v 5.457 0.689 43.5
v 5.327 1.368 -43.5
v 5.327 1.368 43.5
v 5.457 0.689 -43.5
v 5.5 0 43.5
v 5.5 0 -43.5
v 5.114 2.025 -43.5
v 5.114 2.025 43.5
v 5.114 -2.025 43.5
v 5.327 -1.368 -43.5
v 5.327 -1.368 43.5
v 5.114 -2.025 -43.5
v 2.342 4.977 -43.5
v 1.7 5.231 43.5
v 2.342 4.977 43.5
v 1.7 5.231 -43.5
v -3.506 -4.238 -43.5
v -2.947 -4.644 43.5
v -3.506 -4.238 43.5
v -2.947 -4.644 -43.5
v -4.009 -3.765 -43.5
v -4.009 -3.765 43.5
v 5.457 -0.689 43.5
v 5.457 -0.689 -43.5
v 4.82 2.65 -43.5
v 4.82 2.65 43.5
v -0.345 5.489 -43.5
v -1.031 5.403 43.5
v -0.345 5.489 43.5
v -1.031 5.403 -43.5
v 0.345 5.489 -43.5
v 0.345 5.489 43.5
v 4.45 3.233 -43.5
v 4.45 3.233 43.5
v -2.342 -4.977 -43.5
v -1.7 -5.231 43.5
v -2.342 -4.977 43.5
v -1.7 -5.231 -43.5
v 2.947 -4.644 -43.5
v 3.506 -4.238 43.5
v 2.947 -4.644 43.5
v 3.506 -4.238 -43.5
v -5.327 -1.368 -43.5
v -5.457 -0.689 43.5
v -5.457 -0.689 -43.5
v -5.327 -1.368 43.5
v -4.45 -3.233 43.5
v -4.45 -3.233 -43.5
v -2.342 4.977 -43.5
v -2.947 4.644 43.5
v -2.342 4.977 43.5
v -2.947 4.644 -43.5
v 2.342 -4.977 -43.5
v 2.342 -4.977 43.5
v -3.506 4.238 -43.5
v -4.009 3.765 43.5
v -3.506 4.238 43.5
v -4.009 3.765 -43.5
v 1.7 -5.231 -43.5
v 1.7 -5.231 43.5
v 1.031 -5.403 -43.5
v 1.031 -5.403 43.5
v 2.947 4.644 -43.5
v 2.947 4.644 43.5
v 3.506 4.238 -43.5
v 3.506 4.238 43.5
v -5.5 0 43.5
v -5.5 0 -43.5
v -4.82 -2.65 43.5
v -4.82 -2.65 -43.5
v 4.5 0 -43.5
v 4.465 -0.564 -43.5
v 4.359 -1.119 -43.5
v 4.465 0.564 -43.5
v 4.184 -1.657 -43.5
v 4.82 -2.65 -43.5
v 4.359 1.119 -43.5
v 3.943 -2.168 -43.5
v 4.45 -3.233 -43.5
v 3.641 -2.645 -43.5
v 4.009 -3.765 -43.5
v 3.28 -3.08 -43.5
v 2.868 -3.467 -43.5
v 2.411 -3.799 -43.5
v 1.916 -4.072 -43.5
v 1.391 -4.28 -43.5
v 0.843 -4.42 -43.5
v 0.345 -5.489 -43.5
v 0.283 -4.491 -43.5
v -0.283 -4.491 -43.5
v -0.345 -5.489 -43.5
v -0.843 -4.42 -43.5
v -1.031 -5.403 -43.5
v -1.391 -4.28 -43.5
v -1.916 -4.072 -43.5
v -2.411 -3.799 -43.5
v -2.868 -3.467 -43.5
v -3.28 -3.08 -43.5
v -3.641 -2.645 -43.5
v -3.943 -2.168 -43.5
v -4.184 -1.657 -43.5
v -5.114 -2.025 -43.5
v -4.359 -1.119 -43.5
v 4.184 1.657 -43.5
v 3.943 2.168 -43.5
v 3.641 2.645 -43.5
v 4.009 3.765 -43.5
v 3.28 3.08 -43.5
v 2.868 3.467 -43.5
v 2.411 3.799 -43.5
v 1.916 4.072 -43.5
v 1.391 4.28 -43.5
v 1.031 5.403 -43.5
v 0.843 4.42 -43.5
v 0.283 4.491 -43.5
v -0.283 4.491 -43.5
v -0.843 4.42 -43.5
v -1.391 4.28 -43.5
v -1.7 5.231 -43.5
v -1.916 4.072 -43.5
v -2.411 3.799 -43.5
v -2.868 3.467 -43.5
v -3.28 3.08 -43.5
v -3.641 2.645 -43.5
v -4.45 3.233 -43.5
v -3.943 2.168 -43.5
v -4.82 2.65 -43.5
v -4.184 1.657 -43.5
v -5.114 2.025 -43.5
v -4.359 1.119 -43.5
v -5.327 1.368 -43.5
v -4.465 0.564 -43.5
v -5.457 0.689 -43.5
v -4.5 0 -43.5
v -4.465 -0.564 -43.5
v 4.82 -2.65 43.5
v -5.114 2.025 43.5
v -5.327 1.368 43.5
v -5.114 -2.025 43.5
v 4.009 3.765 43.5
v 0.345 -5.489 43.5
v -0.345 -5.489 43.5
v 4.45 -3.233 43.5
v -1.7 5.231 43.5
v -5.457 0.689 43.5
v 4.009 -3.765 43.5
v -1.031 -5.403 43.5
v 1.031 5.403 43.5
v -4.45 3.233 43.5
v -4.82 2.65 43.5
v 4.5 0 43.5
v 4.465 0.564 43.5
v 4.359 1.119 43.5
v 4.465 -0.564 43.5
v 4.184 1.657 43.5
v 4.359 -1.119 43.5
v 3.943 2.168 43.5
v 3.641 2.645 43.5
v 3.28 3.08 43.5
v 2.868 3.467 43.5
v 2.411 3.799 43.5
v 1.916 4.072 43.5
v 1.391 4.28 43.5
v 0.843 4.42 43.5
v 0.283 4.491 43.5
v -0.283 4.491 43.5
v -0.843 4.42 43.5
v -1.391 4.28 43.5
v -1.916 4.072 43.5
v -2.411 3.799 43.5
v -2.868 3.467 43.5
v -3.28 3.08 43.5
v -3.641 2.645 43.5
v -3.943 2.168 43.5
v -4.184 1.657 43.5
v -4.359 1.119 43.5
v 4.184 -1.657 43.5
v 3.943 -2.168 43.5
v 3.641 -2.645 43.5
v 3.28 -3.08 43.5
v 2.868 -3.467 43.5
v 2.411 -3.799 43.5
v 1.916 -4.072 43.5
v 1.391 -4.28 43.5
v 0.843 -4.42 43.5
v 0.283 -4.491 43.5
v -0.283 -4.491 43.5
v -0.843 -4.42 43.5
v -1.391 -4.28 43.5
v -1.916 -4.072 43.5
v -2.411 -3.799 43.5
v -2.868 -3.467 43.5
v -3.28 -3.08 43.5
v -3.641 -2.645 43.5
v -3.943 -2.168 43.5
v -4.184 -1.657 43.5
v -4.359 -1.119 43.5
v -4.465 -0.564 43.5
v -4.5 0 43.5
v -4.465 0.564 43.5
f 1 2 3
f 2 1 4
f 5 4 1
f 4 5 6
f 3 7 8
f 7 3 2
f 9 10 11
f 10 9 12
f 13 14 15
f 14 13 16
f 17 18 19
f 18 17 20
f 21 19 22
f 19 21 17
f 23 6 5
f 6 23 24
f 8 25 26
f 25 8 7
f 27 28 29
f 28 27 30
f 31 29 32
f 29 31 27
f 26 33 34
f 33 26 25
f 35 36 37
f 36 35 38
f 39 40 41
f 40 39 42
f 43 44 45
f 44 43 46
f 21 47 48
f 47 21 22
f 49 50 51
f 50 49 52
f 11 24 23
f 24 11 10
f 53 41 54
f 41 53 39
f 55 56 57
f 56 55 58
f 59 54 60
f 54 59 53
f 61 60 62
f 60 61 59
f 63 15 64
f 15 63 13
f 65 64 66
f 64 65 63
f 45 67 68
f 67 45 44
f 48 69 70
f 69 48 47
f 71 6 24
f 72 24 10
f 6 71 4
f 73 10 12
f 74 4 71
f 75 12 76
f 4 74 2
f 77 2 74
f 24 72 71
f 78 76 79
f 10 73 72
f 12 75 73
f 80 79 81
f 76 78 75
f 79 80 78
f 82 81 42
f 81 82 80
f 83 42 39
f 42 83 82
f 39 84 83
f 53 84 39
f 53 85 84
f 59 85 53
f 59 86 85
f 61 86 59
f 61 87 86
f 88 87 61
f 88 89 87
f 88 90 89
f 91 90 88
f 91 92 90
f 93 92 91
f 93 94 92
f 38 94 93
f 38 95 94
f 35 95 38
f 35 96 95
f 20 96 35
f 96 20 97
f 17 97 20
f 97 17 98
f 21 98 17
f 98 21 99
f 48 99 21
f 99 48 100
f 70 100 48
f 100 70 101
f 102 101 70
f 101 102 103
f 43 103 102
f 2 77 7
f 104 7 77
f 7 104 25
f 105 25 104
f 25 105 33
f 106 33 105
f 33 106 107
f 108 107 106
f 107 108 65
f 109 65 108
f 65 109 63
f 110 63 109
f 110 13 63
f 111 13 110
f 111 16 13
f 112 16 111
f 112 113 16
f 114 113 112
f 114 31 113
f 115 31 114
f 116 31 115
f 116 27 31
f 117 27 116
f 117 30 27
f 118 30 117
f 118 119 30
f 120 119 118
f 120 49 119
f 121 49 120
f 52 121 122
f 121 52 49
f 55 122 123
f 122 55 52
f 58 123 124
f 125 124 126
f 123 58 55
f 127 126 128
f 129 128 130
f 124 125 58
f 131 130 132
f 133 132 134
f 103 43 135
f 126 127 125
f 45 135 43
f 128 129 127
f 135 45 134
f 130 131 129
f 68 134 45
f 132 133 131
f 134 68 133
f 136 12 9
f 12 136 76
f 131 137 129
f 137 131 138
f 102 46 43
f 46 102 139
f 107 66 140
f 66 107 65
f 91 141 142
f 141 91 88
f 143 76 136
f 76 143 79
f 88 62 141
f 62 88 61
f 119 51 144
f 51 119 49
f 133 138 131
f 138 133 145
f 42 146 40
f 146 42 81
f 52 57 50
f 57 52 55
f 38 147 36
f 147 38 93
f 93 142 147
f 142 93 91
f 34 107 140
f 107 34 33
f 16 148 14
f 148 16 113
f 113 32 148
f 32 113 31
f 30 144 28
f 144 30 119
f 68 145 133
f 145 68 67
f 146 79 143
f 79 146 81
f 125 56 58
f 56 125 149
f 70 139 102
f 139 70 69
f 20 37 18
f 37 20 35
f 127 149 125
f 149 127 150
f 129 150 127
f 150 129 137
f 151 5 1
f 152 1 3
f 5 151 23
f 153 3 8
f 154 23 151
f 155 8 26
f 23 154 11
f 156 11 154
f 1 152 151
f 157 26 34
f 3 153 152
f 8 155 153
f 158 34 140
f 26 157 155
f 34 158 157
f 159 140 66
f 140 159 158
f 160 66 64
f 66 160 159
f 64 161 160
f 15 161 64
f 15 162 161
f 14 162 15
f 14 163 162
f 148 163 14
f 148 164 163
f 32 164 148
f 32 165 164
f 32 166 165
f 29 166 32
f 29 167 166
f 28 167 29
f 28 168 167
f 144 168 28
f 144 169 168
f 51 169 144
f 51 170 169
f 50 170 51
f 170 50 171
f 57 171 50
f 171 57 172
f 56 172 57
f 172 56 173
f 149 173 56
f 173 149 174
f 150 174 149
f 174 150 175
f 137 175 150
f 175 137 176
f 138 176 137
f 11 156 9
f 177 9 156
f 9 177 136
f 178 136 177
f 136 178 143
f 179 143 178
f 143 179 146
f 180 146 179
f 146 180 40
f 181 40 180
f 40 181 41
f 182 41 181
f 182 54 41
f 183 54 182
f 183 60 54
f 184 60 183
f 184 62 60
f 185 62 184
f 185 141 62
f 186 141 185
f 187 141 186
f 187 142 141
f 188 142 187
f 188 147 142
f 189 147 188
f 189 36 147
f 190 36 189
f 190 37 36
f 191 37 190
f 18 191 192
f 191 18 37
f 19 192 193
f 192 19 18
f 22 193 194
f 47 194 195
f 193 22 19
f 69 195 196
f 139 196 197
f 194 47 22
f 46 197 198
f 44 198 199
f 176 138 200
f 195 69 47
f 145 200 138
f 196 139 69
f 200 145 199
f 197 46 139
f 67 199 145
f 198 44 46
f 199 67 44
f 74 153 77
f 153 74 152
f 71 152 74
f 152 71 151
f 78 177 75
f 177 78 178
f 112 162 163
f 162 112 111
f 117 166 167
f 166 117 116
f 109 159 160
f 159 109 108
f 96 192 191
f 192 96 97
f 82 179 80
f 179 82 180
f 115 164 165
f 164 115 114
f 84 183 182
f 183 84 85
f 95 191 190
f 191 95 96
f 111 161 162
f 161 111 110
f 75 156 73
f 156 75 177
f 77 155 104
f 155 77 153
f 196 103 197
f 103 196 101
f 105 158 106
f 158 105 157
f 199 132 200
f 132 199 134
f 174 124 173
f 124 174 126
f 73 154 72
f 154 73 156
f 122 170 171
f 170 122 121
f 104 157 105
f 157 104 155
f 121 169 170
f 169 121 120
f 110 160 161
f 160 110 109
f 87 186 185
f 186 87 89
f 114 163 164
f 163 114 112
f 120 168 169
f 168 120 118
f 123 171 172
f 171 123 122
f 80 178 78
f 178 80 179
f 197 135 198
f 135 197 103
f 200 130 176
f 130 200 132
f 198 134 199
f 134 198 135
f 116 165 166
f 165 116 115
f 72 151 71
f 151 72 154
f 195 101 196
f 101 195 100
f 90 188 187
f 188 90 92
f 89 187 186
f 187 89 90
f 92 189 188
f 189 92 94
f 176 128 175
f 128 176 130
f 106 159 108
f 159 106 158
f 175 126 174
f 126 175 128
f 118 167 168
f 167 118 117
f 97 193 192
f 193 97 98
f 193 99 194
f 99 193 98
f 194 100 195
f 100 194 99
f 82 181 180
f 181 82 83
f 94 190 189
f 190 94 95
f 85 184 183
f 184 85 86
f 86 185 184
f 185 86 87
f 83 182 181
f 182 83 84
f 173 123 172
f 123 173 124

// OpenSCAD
$fn = 50;


difference() {
	union() {
		translate(v = [0, 0, -43.5000000000]) {
			cylinder(h = 87, r = 5.5000000000);
		}
	}
	union() {
		translate(v = [0, 0, -100.0000000000]) {
			cylinder(h = 200, r = 4.5000000000);
		}
	}
}
